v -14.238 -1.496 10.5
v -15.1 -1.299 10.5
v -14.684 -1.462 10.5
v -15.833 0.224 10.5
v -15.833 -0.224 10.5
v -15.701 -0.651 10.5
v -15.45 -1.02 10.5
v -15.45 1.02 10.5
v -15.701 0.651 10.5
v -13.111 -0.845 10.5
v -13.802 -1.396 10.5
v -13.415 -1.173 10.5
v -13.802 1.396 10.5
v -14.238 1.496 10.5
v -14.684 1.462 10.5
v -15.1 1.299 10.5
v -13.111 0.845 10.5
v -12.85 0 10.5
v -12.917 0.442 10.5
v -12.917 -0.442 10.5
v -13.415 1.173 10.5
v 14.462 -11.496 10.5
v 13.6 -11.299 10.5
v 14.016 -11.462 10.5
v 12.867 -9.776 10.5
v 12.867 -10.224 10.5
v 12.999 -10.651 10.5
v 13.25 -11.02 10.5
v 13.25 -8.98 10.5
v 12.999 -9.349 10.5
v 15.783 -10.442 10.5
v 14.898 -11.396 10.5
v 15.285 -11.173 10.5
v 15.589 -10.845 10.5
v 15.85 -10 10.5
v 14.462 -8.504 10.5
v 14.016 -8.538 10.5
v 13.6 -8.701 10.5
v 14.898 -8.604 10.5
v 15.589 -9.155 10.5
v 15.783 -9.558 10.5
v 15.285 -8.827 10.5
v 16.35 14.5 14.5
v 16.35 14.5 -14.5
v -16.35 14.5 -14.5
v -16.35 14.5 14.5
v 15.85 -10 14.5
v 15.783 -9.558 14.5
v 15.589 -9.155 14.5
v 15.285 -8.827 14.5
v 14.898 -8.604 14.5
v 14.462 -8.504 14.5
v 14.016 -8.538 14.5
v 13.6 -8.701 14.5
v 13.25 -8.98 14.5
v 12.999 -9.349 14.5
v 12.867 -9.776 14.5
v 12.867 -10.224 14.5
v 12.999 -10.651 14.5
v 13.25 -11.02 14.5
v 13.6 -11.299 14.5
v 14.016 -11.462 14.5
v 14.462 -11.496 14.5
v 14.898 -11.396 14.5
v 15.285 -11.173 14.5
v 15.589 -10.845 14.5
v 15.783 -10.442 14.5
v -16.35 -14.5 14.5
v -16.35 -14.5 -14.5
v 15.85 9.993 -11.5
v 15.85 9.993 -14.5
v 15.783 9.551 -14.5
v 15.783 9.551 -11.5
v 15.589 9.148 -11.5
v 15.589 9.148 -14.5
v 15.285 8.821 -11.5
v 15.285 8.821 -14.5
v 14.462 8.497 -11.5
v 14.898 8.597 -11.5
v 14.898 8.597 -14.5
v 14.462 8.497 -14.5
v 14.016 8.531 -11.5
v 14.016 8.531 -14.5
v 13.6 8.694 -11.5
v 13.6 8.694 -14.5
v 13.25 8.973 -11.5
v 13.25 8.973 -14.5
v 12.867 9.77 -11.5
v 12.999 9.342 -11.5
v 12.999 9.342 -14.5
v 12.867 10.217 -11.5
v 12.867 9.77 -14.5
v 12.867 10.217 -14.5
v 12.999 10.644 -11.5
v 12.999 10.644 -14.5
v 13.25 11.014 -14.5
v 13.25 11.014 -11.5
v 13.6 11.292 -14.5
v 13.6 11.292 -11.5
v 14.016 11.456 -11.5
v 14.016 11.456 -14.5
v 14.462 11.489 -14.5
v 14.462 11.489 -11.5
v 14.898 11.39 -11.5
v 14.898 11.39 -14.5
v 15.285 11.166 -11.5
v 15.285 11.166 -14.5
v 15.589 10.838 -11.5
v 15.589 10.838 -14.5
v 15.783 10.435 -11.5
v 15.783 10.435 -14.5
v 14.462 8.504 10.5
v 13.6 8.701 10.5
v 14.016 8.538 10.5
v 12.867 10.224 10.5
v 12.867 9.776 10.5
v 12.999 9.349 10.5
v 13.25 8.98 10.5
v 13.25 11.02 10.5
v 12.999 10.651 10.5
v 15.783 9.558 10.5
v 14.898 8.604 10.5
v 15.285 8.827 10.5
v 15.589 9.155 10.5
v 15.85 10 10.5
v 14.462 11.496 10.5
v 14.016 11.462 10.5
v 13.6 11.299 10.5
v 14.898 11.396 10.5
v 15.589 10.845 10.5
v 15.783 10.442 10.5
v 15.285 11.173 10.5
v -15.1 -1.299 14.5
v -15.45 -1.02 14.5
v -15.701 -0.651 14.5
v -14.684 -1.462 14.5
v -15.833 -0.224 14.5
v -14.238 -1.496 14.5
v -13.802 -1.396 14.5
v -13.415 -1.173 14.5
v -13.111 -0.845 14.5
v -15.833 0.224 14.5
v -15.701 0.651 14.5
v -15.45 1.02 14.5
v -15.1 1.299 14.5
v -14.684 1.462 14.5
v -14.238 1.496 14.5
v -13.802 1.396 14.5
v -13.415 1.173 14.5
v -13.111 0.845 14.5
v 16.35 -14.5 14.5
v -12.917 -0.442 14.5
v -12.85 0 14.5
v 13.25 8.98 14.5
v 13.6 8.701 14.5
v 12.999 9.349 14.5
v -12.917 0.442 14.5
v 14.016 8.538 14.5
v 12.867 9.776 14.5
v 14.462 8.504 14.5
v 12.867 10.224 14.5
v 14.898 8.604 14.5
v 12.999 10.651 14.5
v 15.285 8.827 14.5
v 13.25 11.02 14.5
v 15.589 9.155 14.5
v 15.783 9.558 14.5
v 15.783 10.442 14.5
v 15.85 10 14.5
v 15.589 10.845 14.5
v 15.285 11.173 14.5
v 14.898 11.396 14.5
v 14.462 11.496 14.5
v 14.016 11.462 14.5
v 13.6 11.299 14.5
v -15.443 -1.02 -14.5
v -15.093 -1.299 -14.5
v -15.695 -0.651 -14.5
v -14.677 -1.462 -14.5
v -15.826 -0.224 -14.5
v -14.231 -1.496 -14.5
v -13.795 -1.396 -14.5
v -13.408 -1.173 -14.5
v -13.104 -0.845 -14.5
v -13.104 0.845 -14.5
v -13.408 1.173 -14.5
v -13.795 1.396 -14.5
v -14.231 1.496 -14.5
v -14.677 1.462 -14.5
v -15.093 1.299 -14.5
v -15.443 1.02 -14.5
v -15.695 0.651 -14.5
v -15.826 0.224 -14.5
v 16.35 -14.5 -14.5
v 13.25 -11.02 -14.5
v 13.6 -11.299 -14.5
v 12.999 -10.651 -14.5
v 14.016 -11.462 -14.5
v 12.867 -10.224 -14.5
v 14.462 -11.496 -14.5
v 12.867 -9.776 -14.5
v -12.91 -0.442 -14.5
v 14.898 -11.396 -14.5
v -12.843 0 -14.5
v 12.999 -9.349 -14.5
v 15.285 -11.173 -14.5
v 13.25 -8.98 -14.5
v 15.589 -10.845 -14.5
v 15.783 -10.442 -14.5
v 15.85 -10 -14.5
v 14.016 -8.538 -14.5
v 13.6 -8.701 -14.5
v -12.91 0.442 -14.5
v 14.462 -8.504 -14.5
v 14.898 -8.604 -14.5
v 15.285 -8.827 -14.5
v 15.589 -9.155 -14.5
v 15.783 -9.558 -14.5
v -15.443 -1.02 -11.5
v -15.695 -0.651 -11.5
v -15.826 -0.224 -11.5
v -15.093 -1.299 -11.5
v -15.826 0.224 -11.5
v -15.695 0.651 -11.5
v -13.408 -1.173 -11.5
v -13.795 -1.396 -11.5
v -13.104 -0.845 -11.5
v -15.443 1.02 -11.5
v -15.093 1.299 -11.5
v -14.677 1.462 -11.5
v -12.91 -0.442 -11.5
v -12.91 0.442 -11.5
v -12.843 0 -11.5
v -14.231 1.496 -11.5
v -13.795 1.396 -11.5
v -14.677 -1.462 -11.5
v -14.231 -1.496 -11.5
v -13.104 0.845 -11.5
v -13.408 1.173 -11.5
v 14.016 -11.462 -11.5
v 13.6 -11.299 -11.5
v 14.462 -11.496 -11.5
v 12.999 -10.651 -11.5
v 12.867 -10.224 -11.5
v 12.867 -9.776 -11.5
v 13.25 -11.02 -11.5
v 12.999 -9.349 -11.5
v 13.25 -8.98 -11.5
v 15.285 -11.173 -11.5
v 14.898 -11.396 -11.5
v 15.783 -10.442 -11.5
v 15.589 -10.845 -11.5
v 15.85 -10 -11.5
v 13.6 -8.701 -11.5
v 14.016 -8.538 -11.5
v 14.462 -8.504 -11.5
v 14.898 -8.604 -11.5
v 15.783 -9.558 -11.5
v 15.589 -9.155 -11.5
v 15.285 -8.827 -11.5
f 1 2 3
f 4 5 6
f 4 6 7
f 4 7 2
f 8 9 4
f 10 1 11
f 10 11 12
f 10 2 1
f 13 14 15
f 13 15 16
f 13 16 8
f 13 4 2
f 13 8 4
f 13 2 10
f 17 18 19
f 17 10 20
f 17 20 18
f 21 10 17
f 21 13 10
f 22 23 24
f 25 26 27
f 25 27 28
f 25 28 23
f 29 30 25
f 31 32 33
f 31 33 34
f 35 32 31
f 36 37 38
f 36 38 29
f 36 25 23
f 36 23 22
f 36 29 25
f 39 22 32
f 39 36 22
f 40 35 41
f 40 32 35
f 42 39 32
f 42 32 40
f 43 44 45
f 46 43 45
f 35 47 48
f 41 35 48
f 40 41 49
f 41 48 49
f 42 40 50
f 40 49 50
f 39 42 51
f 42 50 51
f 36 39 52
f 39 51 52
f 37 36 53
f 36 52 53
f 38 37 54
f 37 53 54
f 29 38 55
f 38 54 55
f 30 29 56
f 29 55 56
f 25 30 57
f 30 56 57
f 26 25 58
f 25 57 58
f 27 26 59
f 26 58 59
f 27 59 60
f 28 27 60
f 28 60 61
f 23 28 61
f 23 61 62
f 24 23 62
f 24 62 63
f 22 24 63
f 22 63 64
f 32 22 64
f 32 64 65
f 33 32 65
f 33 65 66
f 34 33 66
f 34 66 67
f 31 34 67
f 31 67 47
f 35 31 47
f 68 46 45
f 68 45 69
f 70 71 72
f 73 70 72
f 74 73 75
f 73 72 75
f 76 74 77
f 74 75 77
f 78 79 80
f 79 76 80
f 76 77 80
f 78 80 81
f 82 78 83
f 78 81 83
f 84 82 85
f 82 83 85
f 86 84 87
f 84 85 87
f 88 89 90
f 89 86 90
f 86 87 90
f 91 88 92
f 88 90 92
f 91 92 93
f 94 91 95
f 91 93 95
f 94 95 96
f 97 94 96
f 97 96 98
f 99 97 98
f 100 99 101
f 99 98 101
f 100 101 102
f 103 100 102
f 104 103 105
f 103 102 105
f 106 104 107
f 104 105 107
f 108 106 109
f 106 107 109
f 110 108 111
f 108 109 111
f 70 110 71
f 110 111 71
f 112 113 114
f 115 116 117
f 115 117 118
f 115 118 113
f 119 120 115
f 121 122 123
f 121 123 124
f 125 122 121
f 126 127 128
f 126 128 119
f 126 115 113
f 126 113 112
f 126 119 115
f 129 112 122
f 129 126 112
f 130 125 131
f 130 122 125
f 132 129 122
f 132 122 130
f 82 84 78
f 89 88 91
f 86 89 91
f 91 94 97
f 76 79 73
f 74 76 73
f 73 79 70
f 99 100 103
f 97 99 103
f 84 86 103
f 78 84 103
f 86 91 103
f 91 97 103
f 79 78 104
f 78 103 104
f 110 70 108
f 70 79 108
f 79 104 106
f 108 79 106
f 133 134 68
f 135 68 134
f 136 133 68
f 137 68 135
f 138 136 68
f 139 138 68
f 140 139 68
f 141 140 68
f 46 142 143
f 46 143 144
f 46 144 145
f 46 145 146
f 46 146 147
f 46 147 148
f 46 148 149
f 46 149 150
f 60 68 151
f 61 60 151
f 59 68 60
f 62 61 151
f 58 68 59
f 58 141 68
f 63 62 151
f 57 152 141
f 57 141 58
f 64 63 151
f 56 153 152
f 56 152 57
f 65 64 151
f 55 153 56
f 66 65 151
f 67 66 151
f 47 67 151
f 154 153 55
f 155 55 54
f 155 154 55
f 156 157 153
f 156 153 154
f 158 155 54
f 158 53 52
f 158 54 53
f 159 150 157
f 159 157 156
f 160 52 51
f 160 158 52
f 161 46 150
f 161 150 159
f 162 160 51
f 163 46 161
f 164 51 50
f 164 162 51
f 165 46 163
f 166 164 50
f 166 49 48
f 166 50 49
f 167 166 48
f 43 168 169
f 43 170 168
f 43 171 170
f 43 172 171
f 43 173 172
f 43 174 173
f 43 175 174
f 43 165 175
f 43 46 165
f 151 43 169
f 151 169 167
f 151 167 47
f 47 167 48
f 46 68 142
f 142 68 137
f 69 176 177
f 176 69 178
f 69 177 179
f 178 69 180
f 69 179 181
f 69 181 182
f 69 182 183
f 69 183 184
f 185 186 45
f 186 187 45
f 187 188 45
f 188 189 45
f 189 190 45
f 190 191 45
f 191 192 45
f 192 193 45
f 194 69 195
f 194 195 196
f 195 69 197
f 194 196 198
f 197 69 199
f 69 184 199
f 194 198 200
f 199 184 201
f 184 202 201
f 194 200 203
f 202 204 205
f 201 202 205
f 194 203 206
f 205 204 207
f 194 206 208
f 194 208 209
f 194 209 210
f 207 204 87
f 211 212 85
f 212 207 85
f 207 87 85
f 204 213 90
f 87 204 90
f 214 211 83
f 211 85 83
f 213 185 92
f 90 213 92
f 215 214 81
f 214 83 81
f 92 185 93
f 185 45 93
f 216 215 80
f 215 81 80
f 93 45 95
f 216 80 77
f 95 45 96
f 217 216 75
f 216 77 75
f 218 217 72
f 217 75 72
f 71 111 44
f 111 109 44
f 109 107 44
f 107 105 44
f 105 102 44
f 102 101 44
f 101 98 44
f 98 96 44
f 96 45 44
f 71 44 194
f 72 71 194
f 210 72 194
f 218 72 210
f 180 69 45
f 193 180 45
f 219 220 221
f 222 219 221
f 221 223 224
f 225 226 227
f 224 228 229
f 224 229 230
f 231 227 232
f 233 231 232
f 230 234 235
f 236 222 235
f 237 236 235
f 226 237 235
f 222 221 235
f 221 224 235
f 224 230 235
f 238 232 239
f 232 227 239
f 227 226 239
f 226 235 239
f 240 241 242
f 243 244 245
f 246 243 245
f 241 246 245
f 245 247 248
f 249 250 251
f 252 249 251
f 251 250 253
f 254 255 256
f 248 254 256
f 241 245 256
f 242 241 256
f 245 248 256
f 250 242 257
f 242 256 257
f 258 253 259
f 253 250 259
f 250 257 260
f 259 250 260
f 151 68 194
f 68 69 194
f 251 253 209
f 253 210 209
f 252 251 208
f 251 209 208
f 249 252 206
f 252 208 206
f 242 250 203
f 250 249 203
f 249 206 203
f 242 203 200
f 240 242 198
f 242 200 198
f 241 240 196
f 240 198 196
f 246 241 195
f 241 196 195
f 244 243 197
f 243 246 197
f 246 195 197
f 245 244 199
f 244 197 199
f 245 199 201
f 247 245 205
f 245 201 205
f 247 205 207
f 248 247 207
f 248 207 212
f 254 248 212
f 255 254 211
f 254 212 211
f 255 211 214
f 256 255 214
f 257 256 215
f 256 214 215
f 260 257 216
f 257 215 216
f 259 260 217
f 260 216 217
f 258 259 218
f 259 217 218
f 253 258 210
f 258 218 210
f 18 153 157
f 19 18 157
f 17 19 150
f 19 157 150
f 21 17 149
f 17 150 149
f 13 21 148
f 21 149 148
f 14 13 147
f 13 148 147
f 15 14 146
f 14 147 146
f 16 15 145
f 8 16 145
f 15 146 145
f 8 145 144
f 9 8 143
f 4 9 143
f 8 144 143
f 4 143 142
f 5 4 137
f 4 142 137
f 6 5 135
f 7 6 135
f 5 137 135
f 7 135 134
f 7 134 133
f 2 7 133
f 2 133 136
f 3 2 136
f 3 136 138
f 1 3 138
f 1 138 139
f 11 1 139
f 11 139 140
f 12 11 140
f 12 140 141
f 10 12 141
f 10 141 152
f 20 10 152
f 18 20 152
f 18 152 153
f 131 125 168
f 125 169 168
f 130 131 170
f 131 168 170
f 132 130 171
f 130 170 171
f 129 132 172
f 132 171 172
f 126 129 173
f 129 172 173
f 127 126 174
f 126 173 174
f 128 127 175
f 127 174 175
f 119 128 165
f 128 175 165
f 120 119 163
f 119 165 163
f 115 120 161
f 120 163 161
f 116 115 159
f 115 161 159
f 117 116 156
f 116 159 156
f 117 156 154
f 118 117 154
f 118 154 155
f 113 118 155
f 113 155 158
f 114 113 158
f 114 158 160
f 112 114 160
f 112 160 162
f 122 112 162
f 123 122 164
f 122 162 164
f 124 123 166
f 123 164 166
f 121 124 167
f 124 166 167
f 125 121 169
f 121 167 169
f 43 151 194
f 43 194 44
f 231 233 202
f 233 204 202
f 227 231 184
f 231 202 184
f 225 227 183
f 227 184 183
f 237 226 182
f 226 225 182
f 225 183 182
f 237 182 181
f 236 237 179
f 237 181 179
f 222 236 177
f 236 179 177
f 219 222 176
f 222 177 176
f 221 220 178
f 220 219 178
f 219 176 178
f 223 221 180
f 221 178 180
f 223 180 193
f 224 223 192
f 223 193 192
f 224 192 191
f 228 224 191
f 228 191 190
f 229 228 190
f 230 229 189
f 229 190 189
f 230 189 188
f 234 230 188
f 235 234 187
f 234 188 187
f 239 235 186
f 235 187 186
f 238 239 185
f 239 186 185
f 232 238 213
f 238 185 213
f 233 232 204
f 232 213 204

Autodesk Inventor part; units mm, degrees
ref_plane "YZ Plane" through (0, 0, 0) normal (1, 0, 0) x (0, 1, 0)
ref_plane "XZ Plane" through (0, 0, 0) normal (0, 1, 0) x (-1, 0, 0)
sketch "Sketch1" plane through (0, 0, 0) normal (0, 0, 1) x (1, 0, 0)
  line L0 (-16.35, -14.5) -> (16.35, -14.5)
  line L1 (16.35, -14.5) -> (16.35, 14.5)
  line L2 (16.35, 14.5) -> (-16.35, 14.5)
  line L3 (-16.35, 14.5) -> (-16.35, -14.5)
  line L4 (-16.35, -14.5) -> (16.35, 14.5) construction
  line L5 (16.35, -14.5) -> (-16.35, 14.5) construction
  point P0 (0, 0)
  dimension "d0" = 32.7
  dimension "d1" = 29
extrude "Extrusion1" add sketch "Sketch1" along normal mid plane 29
sketch "Sketch2" plane through (0, 0, 14.5) normal (0, 0, 1) x (1, 0, 0)
  circle A0 centre (14.35, 10) radius 1.5
  circle A1 centre (14.35, -10) radius 1.5
  circle A2 centre (-14.35, 0) radius 1.5
  line L0 (16.35, -14.5) -> (16.35, 14.5) projected
  line L1 (-26.8046, 0) -> (27.4172, 0)
  point P0 (0, 0)
  dimension "d4" = 3
  dimension "d5" = 3
  dimension "d6" = 3
  dimension "d7" = 20
  dimension "d8" = 2
  dimension "d9" = 28.7
extrude "Extrusion2" cut sketch "Sketch2" against normal blind 4
thread "Thread1" size "M3x0.5" class "6H" standard "ANSI Metric M Profile" length 5
thread "Thread2" size "M3x0.5" class "6H" standard "ANSI Metric M Profile" length 5
thread "Thread3" size "M3x0.5" class "6H" standard "ANSI Metric M Profile" length 5
sketch "Sketch3" plane through (0, 0, -14.5) normal (0, 0, -1) x (-1, 0, 0)
  point P0 (0, 0)
sketch "Sketch4" plane through (-16.35, 14.5, 14.5) normal (0, 1, 0) x (1, 0, 0)
  point P0 (16.35, 14.5)
ref_plane "Work Plane2" through (0, 0, -14.5) normal (0, 0, 1) x (1, 0, 0)
sketch "Sketch6" plane through (0, 0, -14.5) normal (0, 0, 1) x (1, 0, 0)
  circle A0 centre (-14.3431, 0) radius 1.5
  circle A1 centre (14.35, -10) radius 1.5 projected
  circle A2 centre (14.35, -10) radius 1.5
  circle A3 centre (14.35, 9.9933) radius 1.5
  point P0 (0, 0)
  dimension "d20" = 3
  dimension "d21" = 3
  dimension "d22" = 3
sketch "Sketch7" plane through (0, 0, -14.5) normal (0, 0, -1) x (-1, 0, 0)
  point P0 (0, 0)
extrude "Extrusion3" cut sketch "Sketch6" along normal blind 3
thread "Thread4" size "M3x0.5" class "6H" standard "ANSI Metric M Profile" length 5
thread "Thread5" size "M3x0.5" class "6H" standard "ANSI Metric M Profile" length 5
thread "Thread6" size "M3x0.5" class "6H" standard "ANSI Metric M Profile" length 5
equation "\"d23\" = d20"
properties part number "Camera" material "Steel, Alloy"
